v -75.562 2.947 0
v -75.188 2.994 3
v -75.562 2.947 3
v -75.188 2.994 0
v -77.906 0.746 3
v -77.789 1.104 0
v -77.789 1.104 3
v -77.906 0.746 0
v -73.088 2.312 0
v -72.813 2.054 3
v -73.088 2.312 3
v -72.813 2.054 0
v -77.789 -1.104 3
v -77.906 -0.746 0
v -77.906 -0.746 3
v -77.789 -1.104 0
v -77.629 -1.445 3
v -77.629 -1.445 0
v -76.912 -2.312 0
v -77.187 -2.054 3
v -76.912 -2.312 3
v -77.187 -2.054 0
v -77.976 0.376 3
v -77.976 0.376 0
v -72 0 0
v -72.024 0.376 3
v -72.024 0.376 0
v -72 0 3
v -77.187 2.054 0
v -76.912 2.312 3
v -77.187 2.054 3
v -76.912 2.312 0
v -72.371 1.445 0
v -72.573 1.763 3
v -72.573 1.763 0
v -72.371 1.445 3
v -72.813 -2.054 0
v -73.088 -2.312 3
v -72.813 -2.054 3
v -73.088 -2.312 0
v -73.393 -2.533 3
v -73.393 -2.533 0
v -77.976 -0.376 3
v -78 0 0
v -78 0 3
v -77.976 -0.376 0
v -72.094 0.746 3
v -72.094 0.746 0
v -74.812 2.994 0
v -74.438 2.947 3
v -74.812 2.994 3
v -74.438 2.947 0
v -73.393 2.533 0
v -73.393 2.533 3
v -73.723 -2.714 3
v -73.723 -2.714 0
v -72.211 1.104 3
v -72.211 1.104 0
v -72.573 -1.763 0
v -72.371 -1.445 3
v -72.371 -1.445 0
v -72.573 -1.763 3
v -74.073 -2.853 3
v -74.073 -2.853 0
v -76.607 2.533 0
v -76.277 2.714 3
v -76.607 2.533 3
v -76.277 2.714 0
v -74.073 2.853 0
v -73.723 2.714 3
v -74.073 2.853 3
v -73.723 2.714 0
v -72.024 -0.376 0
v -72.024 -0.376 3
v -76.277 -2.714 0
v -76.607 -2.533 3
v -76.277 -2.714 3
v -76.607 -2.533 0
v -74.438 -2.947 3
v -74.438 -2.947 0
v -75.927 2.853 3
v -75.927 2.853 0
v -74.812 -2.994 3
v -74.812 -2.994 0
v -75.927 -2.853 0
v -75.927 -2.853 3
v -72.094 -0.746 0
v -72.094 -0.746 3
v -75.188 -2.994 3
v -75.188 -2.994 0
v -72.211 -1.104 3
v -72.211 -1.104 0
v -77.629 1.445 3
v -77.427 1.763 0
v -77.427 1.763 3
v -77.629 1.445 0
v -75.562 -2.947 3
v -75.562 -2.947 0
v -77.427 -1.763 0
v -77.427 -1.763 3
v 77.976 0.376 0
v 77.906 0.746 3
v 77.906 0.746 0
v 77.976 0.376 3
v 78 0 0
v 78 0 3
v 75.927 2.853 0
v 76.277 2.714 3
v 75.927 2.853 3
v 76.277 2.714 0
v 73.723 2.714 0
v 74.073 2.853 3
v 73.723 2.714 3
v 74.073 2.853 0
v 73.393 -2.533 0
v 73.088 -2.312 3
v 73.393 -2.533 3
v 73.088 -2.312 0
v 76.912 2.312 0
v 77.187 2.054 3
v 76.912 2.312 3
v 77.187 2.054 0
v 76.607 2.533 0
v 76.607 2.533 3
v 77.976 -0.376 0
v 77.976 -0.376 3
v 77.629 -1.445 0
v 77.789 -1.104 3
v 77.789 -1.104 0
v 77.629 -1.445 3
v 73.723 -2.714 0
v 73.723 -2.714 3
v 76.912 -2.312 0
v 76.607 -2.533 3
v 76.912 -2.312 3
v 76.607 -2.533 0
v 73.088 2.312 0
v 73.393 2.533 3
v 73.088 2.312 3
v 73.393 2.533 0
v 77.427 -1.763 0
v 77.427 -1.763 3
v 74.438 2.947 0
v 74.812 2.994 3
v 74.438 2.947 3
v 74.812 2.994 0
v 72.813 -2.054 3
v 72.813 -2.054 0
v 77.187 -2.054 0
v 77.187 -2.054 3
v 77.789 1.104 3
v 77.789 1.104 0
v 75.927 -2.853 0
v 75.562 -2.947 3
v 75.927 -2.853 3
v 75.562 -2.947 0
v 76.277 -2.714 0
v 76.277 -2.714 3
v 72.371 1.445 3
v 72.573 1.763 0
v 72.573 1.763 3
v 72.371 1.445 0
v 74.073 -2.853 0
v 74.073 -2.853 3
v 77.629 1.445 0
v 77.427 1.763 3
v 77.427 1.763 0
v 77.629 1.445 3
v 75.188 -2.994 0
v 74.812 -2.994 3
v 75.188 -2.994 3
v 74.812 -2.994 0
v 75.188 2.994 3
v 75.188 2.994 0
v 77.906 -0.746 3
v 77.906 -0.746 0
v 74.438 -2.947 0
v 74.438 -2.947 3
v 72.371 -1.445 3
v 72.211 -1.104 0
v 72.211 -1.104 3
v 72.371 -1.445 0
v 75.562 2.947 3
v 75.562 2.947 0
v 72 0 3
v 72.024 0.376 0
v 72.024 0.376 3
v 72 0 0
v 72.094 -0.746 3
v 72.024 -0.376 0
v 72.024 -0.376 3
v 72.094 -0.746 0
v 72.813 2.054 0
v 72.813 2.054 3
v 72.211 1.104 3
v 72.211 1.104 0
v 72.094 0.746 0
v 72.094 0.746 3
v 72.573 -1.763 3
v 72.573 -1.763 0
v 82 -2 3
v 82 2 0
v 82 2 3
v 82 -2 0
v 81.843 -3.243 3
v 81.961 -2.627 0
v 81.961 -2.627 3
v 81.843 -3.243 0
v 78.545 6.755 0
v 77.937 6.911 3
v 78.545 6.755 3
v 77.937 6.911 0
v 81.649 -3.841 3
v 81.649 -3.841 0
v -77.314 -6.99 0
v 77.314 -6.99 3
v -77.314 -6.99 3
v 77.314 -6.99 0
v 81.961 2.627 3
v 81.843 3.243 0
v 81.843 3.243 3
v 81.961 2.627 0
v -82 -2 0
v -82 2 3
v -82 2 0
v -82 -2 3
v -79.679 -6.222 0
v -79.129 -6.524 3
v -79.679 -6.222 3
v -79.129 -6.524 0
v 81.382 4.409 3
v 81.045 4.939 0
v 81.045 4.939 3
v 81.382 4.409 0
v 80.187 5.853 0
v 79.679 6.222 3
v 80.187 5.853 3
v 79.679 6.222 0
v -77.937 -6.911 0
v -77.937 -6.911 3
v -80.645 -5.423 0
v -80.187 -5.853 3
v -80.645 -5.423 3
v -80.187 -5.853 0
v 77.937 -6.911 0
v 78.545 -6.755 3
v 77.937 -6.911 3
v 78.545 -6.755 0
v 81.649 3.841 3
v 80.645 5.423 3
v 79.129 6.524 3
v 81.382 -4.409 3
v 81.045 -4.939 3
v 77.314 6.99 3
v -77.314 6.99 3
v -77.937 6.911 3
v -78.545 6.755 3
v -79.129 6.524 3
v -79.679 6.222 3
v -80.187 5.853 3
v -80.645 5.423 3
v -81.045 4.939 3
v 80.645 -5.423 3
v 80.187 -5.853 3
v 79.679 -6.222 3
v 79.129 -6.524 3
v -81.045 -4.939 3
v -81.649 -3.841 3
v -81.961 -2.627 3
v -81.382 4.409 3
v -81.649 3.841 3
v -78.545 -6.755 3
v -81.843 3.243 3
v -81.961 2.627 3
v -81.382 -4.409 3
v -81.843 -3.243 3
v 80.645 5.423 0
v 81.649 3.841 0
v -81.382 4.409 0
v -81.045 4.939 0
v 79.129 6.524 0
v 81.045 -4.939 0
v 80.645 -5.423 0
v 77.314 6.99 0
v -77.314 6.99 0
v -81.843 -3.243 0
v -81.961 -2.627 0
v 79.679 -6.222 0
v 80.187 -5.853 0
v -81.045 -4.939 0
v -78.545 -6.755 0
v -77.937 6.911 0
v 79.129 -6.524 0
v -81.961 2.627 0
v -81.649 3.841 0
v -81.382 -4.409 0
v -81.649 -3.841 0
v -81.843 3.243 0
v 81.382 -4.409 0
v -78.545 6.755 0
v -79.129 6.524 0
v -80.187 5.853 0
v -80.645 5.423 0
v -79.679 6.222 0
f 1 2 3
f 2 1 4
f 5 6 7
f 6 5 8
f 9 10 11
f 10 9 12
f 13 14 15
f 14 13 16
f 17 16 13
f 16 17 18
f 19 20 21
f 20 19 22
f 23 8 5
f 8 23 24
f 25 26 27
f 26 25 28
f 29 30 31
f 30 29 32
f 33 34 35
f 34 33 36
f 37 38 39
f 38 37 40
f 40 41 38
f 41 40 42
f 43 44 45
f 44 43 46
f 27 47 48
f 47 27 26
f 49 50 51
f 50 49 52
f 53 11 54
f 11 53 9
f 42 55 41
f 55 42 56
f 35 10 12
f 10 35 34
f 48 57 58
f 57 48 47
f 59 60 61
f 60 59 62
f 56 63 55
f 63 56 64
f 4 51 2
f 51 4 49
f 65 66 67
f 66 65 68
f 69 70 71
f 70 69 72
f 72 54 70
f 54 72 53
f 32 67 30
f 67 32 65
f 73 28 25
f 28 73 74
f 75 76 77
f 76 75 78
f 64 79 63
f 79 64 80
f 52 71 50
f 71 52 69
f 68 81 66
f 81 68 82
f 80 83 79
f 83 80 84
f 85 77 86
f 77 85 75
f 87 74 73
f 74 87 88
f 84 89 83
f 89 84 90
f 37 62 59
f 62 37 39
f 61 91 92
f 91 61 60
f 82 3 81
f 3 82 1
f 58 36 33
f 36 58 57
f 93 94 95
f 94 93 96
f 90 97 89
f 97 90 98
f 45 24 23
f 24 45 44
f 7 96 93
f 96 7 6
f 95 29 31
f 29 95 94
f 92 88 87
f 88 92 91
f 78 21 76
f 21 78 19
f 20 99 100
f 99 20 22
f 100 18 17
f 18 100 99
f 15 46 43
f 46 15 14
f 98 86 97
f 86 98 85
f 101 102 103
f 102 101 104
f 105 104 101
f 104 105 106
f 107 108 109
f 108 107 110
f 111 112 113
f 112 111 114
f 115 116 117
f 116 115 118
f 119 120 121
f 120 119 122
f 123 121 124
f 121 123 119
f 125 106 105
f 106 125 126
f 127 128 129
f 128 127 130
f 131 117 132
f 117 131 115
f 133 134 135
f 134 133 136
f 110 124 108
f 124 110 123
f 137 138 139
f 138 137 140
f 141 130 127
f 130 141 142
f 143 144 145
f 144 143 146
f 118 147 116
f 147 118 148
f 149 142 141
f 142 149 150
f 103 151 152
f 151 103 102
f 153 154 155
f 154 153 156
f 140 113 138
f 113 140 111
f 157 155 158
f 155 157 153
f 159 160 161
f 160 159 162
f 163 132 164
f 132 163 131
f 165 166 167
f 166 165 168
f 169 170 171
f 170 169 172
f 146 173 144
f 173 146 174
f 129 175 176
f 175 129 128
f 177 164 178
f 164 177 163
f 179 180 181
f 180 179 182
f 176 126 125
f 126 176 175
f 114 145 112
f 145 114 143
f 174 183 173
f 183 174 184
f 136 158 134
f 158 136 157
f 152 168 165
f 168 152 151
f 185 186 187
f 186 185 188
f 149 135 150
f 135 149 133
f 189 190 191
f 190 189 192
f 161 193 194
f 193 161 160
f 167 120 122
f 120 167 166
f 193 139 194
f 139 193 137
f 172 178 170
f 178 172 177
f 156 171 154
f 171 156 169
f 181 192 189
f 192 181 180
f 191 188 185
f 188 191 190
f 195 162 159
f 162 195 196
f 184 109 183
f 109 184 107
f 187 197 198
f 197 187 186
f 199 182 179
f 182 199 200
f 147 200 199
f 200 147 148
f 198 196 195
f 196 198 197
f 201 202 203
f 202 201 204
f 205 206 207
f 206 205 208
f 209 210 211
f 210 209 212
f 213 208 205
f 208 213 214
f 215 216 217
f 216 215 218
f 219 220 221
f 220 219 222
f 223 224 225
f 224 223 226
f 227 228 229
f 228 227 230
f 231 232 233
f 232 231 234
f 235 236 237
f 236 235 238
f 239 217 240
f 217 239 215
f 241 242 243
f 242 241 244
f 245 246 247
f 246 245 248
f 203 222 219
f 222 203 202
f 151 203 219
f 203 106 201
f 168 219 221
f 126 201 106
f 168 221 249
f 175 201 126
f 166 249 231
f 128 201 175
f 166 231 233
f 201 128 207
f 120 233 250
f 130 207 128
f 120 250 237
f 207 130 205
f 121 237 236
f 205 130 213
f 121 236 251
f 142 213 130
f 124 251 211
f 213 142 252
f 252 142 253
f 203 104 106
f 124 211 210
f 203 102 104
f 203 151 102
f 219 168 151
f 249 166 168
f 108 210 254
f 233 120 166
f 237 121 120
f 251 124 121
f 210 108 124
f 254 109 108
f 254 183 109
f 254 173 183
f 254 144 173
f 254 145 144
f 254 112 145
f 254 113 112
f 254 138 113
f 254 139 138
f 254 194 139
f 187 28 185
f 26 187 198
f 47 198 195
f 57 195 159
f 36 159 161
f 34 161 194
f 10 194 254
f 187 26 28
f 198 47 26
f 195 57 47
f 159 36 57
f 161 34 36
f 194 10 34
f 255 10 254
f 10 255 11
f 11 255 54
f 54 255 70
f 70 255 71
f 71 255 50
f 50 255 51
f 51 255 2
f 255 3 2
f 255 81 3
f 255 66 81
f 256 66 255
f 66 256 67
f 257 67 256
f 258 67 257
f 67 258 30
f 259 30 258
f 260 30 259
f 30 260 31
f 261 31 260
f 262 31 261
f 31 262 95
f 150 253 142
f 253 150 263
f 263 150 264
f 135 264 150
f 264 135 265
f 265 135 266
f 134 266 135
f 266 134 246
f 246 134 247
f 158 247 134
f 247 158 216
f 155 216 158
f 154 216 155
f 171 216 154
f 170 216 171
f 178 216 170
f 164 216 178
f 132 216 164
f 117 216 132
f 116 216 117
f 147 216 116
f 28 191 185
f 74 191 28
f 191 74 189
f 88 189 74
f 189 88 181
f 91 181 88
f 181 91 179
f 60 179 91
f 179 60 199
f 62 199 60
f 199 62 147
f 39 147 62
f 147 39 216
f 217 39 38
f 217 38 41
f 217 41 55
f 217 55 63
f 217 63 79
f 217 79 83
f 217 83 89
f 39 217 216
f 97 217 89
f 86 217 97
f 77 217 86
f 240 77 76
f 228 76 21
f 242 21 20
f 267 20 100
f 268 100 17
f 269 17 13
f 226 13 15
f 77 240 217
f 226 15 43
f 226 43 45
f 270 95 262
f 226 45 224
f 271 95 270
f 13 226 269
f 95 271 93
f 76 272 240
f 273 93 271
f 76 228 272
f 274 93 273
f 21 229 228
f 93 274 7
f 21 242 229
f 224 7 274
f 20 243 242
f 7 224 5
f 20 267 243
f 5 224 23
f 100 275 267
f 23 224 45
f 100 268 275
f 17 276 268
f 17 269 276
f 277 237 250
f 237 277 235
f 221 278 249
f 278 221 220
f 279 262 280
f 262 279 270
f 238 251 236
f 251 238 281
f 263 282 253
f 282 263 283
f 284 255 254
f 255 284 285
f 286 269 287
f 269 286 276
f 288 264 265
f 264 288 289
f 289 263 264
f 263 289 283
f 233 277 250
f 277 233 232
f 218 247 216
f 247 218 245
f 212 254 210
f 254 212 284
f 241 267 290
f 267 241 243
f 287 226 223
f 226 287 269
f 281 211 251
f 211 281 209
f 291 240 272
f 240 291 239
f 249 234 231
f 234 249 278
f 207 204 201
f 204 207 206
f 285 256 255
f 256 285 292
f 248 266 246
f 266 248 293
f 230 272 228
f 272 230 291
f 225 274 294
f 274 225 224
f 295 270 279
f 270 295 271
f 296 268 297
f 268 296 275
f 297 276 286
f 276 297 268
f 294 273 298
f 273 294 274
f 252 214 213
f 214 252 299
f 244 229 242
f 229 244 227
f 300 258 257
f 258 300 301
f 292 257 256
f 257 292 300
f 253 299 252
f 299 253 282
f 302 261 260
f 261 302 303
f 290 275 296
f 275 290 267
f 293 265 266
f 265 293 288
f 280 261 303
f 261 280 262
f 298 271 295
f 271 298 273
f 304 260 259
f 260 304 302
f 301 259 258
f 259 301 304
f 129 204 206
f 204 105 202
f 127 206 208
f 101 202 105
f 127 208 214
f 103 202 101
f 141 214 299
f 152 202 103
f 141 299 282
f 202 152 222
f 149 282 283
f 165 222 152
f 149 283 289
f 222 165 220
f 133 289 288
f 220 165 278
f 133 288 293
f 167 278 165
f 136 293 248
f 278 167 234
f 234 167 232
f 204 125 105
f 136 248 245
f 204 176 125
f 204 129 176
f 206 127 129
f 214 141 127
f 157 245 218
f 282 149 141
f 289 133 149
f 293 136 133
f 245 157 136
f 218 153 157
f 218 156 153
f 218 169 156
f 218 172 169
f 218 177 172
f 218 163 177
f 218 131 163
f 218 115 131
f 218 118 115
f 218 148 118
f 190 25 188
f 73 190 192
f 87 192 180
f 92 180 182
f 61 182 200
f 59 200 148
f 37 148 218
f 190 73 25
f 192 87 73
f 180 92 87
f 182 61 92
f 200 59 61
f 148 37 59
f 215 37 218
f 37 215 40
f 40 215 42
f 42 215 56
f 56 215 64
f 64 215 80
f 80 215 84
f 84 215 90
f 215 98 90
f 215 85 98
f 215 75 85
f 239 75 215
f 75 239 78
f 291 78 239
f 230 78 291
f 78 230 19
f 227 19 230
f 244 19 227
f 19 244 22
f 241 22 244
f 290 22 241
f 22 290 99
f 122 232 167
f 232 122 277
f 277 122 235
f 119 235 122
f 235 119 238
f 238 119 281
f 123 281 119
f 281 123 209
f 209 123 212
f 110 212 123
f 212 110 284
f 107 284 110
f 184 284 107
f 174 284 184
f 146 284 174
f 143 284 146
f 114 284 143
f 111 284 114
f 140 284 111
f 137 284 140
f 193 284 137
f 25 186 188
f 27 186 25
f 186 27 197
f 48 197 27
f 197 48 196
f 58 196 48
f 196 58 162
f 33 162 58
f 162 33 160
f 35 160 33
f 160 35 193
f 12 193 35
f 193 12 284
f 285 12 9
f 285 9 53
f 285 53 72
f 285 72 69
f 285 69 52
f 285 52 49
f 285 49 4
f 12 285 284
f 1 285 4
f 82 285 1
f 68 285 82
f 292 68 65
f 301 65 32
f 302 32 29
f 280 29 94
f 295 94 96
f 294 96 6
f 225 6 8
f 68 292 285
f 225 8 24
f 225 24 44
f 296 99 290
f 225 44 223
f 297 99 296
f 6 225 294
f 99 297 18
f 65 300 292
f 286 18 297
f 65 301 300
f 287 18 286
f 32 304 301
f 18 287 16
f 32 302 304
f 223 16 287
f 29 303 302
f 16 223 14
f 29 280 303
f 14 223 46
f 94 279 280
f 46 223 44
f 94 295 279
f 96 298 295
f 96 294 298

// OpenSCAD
$fn = 50;


difference() {
	union() {
		hull() {
			translate(v = [-77.0000000000, 2.0000000000, 0]) {
				cylinder(h = 3, r = 5);
			}
			translate(v = [77.0000000000, 2.0000000000, 0]) {
				cylinder(h = 3, r = 5);
			}
			translate(v = [-77.0000000000, -2.0000000000, 0]) {
				cylinder(h = 3, r = 5);
			}
			translate(v = [77.0000000000, -2.0000000000, 0]) {
				cylinder(h = 3, r = 5);
			}
		}
	}
	union() {
		translate(v = [-75.0000000000, 0.0000000000, -100.0000000000]) {
			cylinder(h = 200, r = 3.0000000000);
		}
		translate(v = [-75.0000000000, 0.0000000000, -100.0000000000]) {
			cylinder(h = 200, r = 3.0000000000);
		}
		translate(v = [75.0000000000, 0.0000000000, -100.0000000000]) {
			cylinder(h = 200, r = 3.0000000000);
		}
		translate(v = [75.0000000000, 0.0000000000, -100.0000000000]) {
			cylinder(h = 200, r = 3.0000000000);
		}
	}
}
